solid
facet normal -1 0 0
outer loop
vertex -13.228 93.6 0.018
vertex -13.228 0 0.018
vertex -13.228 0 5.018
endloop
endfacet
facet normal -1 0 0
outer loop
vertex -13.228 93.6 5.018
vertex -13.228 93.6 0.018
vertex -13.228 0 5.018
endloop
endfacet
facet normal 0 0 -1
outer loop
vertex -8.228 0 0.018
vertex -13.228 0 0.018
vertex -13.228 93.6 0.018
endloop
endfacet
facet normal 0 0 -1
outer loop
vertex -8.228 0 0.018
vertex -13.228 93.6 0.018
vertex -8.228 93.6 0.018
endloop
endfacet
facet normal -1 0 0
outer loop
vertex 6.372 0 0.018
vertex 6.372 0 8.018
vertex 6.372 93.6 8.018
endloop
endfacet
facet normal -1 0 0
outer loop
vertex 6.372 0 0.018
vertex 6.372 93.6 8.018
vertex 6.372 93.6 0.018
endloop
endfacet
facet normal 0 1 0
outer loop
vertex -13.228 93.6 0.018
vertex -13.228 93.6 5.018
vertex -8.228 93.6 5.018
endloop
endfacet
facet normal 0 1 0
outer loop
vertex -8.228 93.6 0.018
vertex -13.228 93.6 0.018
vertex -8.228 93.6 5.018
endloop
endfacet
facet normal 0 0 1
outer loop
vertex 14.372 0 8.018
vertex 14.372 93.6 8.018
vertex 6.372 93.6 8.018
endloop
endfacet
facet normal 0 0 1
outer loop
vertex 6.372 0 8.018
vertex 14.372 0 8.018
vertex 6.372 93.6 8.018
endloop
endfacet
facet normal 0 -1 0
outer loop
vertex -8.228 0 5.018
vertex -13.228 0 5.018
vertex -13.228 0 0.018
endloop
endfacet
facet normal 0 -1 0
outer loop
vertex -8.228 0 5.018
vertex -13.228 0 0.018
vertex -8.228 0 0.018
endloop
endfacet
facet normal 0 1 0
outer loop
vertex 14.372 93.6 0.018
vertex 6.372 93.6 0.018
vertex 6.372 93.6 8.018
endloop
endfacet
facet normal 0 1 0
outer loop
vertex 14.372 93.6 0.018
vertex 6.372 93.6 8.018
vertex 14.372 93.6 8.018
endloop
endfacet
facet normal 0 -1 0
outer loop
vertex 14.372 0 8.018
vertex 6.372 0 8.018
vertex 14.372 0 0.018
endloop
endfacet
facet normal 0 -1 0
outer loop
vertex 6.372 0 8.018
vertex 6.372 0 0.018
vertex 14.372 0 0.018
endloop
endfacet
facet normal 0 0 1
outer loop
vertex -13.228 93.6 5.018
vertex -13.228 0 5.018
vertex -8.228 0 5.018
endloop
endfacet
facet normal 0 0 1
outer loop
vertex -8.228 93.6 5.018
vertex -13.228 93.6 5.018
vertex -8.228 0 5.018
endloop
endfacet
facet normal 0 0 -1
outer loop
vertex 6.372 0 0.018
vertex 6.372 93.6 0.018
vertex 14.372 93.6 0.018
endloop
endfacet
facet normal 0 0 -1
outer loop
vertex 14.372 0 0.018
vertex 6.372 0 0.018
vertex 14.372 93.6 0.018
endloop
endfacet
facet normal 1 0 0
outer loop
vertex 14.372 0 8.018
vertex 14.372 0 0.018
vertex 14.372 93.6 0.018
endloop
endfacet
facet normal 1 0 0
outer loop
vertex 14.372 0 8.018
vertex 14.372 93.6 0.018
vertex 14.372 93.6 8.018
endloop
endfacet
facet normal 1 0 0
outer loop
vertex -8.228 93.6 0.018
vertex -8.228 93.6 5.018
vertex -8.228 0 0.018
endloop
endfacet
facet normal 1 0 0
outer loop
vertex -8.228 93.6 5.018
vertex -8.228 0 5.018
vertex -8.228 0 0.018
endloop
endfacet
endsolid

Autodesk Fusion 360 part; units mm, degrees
sketch "Sketch1" plane through (0, 0, 0) normal (0, 1, 0) x (1, 0, 0)
  line L0 (-41.6403, -0.018) -> (25.1836, -0.018)
  line L1 (-8.2283, -0.018) -> (-13.2283, -0.018)
  line L2 (-13.2283, -0.018) -> (-13.2283, -5.018)
  line L3 (-13.2283, -5.018) -> (-8.2283, -5.018)
  line L4 (-8.2283, -5.018) -> (-8.2283, -0.018)
  line L5 (6.3716, -0.018) -> (14.3716, -0.018)
  line L6 (14.3716, -0.018) -> (14.3716, -8.018)
  line L7 (14.3716, -8.018) -> (6.3716, -8.018)
  line L8 (6.3716, -8.018) -> (6.3716, -0.018)
  dimension "d1" = 5
  dimension "d2" = 5
  dimension "d3" = 8
  dimension "d4" = 8
extrude "Extrude1" add sketch "Sketch1" along normal blind 93.6 contours L0 L1 L2 L3 L4 makes body 1
extrude "Extrude2" add sketch "Sketch1" along normal blind 93.6 separate body contours L0 L5 L6 L7 L8 makes body 2
